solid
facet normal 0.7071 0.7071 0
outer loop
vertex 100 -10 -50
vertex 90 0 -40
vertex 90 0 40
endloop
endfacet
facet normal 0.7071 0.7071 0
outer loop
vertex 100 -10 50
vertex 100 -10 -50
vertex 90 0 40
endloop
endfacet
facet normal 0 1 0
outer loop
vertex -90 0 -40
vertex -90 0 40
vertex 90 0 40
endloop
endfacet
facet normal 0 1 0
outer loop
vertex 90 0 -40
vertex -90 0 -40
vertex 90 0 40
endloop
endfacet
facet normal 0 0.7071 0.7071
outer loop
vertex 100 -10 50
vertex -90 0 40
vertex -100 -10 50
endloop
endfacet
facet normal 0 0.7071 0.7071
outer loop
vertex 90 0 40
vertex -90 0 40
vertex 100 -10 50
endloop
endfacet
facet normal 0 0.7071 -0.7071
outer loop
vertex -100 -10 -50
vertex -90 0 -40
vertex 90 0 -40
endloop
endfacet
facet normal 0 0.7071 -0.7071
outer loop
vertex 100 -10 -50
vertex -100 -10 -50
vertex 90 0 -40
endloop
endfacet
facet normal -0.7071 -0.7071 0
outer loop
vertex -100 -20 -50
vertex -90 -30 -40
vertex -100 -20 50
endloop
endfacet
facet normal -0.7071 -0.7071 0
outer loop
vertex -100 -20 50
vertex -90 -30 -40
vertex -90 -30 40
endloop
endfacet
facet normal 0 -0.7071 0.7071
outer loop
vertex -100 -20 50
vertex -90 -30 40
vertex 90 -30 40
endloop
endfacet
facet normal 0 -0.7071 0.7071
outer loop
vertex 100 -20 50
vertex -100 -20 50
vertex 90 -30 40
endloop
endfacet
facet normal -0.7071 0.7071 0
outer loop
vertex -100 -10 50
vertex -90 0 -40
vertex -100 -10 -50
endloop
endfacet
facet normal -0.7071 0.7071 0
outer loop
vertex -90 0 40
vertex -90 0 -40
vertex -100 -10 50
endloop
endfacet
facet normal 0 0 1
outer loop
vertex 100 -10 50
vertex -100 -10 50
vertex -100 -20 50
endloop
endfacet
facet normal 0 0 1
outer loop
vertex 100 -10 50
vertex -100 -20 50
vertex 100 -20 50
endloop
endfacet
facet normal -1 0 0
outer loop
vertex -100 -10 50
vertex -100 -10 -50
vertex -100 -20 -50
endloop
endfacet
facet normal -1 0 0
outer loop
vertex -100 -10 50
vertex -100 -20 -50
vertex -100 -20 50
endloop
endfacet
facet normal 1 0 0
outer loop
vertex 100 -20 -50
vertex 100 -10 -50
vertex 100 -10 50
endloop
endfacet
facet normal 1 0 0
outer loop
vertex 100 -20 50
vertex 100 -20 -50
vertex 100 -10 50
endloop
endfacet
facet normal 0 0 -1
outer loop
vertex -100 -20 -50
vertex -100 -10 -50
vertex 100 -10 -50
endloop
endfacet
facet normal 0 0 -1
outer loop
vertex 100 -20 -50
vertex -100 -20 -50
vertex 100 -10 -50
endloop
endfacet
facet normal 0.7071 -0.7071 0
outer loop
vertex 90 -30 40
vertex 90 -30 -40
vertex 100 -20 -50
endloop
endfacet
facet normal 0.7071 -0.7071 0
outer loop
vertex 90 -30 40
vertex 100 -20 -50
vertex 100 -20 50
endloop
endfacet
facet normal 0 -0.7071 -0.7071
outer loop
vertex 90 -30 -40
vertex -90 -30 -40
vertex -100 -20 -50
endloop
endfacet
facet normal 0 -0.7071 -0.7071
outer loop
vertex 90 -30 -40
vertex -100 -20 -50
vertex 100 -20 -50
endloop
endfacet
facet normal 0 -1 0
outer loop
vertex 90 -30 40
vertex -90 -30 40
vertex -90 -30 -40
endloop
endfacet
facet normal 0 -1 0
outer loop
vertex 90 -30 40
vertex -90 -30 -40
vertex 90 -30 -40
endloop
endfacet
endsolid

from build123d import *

# Parameters (mm, degrees)
F0_W     = 200
F0_H     = 100
F1_DEPTH = 30
F2_SIZE2 = 10
F2_SIZE  = 10


with BuildPart() as f1:
    # F0 (on Front) → F1 (new body)
    with BuildSketch(Plane.XZ):
        Rectangle(F0_W, F0_H)
    extrude(amount=F1_DEPTH)

    # F2
    f2_edges = [f1.edges().sort_by_distance(p)[0] for p in [
        (0, -30, 50),
        (0, -30, -50),
        (100, -30, 0),
        (-100, -30, 0),
        (-100, 0, 0),
        (0, 0, 50),
        (0, 0, -50),
        (100, 0, 0),
    ]]
    chamfer(f2_edges, length=F2_SIZE, length2=F2_SIZE2)


solid = f1.part
